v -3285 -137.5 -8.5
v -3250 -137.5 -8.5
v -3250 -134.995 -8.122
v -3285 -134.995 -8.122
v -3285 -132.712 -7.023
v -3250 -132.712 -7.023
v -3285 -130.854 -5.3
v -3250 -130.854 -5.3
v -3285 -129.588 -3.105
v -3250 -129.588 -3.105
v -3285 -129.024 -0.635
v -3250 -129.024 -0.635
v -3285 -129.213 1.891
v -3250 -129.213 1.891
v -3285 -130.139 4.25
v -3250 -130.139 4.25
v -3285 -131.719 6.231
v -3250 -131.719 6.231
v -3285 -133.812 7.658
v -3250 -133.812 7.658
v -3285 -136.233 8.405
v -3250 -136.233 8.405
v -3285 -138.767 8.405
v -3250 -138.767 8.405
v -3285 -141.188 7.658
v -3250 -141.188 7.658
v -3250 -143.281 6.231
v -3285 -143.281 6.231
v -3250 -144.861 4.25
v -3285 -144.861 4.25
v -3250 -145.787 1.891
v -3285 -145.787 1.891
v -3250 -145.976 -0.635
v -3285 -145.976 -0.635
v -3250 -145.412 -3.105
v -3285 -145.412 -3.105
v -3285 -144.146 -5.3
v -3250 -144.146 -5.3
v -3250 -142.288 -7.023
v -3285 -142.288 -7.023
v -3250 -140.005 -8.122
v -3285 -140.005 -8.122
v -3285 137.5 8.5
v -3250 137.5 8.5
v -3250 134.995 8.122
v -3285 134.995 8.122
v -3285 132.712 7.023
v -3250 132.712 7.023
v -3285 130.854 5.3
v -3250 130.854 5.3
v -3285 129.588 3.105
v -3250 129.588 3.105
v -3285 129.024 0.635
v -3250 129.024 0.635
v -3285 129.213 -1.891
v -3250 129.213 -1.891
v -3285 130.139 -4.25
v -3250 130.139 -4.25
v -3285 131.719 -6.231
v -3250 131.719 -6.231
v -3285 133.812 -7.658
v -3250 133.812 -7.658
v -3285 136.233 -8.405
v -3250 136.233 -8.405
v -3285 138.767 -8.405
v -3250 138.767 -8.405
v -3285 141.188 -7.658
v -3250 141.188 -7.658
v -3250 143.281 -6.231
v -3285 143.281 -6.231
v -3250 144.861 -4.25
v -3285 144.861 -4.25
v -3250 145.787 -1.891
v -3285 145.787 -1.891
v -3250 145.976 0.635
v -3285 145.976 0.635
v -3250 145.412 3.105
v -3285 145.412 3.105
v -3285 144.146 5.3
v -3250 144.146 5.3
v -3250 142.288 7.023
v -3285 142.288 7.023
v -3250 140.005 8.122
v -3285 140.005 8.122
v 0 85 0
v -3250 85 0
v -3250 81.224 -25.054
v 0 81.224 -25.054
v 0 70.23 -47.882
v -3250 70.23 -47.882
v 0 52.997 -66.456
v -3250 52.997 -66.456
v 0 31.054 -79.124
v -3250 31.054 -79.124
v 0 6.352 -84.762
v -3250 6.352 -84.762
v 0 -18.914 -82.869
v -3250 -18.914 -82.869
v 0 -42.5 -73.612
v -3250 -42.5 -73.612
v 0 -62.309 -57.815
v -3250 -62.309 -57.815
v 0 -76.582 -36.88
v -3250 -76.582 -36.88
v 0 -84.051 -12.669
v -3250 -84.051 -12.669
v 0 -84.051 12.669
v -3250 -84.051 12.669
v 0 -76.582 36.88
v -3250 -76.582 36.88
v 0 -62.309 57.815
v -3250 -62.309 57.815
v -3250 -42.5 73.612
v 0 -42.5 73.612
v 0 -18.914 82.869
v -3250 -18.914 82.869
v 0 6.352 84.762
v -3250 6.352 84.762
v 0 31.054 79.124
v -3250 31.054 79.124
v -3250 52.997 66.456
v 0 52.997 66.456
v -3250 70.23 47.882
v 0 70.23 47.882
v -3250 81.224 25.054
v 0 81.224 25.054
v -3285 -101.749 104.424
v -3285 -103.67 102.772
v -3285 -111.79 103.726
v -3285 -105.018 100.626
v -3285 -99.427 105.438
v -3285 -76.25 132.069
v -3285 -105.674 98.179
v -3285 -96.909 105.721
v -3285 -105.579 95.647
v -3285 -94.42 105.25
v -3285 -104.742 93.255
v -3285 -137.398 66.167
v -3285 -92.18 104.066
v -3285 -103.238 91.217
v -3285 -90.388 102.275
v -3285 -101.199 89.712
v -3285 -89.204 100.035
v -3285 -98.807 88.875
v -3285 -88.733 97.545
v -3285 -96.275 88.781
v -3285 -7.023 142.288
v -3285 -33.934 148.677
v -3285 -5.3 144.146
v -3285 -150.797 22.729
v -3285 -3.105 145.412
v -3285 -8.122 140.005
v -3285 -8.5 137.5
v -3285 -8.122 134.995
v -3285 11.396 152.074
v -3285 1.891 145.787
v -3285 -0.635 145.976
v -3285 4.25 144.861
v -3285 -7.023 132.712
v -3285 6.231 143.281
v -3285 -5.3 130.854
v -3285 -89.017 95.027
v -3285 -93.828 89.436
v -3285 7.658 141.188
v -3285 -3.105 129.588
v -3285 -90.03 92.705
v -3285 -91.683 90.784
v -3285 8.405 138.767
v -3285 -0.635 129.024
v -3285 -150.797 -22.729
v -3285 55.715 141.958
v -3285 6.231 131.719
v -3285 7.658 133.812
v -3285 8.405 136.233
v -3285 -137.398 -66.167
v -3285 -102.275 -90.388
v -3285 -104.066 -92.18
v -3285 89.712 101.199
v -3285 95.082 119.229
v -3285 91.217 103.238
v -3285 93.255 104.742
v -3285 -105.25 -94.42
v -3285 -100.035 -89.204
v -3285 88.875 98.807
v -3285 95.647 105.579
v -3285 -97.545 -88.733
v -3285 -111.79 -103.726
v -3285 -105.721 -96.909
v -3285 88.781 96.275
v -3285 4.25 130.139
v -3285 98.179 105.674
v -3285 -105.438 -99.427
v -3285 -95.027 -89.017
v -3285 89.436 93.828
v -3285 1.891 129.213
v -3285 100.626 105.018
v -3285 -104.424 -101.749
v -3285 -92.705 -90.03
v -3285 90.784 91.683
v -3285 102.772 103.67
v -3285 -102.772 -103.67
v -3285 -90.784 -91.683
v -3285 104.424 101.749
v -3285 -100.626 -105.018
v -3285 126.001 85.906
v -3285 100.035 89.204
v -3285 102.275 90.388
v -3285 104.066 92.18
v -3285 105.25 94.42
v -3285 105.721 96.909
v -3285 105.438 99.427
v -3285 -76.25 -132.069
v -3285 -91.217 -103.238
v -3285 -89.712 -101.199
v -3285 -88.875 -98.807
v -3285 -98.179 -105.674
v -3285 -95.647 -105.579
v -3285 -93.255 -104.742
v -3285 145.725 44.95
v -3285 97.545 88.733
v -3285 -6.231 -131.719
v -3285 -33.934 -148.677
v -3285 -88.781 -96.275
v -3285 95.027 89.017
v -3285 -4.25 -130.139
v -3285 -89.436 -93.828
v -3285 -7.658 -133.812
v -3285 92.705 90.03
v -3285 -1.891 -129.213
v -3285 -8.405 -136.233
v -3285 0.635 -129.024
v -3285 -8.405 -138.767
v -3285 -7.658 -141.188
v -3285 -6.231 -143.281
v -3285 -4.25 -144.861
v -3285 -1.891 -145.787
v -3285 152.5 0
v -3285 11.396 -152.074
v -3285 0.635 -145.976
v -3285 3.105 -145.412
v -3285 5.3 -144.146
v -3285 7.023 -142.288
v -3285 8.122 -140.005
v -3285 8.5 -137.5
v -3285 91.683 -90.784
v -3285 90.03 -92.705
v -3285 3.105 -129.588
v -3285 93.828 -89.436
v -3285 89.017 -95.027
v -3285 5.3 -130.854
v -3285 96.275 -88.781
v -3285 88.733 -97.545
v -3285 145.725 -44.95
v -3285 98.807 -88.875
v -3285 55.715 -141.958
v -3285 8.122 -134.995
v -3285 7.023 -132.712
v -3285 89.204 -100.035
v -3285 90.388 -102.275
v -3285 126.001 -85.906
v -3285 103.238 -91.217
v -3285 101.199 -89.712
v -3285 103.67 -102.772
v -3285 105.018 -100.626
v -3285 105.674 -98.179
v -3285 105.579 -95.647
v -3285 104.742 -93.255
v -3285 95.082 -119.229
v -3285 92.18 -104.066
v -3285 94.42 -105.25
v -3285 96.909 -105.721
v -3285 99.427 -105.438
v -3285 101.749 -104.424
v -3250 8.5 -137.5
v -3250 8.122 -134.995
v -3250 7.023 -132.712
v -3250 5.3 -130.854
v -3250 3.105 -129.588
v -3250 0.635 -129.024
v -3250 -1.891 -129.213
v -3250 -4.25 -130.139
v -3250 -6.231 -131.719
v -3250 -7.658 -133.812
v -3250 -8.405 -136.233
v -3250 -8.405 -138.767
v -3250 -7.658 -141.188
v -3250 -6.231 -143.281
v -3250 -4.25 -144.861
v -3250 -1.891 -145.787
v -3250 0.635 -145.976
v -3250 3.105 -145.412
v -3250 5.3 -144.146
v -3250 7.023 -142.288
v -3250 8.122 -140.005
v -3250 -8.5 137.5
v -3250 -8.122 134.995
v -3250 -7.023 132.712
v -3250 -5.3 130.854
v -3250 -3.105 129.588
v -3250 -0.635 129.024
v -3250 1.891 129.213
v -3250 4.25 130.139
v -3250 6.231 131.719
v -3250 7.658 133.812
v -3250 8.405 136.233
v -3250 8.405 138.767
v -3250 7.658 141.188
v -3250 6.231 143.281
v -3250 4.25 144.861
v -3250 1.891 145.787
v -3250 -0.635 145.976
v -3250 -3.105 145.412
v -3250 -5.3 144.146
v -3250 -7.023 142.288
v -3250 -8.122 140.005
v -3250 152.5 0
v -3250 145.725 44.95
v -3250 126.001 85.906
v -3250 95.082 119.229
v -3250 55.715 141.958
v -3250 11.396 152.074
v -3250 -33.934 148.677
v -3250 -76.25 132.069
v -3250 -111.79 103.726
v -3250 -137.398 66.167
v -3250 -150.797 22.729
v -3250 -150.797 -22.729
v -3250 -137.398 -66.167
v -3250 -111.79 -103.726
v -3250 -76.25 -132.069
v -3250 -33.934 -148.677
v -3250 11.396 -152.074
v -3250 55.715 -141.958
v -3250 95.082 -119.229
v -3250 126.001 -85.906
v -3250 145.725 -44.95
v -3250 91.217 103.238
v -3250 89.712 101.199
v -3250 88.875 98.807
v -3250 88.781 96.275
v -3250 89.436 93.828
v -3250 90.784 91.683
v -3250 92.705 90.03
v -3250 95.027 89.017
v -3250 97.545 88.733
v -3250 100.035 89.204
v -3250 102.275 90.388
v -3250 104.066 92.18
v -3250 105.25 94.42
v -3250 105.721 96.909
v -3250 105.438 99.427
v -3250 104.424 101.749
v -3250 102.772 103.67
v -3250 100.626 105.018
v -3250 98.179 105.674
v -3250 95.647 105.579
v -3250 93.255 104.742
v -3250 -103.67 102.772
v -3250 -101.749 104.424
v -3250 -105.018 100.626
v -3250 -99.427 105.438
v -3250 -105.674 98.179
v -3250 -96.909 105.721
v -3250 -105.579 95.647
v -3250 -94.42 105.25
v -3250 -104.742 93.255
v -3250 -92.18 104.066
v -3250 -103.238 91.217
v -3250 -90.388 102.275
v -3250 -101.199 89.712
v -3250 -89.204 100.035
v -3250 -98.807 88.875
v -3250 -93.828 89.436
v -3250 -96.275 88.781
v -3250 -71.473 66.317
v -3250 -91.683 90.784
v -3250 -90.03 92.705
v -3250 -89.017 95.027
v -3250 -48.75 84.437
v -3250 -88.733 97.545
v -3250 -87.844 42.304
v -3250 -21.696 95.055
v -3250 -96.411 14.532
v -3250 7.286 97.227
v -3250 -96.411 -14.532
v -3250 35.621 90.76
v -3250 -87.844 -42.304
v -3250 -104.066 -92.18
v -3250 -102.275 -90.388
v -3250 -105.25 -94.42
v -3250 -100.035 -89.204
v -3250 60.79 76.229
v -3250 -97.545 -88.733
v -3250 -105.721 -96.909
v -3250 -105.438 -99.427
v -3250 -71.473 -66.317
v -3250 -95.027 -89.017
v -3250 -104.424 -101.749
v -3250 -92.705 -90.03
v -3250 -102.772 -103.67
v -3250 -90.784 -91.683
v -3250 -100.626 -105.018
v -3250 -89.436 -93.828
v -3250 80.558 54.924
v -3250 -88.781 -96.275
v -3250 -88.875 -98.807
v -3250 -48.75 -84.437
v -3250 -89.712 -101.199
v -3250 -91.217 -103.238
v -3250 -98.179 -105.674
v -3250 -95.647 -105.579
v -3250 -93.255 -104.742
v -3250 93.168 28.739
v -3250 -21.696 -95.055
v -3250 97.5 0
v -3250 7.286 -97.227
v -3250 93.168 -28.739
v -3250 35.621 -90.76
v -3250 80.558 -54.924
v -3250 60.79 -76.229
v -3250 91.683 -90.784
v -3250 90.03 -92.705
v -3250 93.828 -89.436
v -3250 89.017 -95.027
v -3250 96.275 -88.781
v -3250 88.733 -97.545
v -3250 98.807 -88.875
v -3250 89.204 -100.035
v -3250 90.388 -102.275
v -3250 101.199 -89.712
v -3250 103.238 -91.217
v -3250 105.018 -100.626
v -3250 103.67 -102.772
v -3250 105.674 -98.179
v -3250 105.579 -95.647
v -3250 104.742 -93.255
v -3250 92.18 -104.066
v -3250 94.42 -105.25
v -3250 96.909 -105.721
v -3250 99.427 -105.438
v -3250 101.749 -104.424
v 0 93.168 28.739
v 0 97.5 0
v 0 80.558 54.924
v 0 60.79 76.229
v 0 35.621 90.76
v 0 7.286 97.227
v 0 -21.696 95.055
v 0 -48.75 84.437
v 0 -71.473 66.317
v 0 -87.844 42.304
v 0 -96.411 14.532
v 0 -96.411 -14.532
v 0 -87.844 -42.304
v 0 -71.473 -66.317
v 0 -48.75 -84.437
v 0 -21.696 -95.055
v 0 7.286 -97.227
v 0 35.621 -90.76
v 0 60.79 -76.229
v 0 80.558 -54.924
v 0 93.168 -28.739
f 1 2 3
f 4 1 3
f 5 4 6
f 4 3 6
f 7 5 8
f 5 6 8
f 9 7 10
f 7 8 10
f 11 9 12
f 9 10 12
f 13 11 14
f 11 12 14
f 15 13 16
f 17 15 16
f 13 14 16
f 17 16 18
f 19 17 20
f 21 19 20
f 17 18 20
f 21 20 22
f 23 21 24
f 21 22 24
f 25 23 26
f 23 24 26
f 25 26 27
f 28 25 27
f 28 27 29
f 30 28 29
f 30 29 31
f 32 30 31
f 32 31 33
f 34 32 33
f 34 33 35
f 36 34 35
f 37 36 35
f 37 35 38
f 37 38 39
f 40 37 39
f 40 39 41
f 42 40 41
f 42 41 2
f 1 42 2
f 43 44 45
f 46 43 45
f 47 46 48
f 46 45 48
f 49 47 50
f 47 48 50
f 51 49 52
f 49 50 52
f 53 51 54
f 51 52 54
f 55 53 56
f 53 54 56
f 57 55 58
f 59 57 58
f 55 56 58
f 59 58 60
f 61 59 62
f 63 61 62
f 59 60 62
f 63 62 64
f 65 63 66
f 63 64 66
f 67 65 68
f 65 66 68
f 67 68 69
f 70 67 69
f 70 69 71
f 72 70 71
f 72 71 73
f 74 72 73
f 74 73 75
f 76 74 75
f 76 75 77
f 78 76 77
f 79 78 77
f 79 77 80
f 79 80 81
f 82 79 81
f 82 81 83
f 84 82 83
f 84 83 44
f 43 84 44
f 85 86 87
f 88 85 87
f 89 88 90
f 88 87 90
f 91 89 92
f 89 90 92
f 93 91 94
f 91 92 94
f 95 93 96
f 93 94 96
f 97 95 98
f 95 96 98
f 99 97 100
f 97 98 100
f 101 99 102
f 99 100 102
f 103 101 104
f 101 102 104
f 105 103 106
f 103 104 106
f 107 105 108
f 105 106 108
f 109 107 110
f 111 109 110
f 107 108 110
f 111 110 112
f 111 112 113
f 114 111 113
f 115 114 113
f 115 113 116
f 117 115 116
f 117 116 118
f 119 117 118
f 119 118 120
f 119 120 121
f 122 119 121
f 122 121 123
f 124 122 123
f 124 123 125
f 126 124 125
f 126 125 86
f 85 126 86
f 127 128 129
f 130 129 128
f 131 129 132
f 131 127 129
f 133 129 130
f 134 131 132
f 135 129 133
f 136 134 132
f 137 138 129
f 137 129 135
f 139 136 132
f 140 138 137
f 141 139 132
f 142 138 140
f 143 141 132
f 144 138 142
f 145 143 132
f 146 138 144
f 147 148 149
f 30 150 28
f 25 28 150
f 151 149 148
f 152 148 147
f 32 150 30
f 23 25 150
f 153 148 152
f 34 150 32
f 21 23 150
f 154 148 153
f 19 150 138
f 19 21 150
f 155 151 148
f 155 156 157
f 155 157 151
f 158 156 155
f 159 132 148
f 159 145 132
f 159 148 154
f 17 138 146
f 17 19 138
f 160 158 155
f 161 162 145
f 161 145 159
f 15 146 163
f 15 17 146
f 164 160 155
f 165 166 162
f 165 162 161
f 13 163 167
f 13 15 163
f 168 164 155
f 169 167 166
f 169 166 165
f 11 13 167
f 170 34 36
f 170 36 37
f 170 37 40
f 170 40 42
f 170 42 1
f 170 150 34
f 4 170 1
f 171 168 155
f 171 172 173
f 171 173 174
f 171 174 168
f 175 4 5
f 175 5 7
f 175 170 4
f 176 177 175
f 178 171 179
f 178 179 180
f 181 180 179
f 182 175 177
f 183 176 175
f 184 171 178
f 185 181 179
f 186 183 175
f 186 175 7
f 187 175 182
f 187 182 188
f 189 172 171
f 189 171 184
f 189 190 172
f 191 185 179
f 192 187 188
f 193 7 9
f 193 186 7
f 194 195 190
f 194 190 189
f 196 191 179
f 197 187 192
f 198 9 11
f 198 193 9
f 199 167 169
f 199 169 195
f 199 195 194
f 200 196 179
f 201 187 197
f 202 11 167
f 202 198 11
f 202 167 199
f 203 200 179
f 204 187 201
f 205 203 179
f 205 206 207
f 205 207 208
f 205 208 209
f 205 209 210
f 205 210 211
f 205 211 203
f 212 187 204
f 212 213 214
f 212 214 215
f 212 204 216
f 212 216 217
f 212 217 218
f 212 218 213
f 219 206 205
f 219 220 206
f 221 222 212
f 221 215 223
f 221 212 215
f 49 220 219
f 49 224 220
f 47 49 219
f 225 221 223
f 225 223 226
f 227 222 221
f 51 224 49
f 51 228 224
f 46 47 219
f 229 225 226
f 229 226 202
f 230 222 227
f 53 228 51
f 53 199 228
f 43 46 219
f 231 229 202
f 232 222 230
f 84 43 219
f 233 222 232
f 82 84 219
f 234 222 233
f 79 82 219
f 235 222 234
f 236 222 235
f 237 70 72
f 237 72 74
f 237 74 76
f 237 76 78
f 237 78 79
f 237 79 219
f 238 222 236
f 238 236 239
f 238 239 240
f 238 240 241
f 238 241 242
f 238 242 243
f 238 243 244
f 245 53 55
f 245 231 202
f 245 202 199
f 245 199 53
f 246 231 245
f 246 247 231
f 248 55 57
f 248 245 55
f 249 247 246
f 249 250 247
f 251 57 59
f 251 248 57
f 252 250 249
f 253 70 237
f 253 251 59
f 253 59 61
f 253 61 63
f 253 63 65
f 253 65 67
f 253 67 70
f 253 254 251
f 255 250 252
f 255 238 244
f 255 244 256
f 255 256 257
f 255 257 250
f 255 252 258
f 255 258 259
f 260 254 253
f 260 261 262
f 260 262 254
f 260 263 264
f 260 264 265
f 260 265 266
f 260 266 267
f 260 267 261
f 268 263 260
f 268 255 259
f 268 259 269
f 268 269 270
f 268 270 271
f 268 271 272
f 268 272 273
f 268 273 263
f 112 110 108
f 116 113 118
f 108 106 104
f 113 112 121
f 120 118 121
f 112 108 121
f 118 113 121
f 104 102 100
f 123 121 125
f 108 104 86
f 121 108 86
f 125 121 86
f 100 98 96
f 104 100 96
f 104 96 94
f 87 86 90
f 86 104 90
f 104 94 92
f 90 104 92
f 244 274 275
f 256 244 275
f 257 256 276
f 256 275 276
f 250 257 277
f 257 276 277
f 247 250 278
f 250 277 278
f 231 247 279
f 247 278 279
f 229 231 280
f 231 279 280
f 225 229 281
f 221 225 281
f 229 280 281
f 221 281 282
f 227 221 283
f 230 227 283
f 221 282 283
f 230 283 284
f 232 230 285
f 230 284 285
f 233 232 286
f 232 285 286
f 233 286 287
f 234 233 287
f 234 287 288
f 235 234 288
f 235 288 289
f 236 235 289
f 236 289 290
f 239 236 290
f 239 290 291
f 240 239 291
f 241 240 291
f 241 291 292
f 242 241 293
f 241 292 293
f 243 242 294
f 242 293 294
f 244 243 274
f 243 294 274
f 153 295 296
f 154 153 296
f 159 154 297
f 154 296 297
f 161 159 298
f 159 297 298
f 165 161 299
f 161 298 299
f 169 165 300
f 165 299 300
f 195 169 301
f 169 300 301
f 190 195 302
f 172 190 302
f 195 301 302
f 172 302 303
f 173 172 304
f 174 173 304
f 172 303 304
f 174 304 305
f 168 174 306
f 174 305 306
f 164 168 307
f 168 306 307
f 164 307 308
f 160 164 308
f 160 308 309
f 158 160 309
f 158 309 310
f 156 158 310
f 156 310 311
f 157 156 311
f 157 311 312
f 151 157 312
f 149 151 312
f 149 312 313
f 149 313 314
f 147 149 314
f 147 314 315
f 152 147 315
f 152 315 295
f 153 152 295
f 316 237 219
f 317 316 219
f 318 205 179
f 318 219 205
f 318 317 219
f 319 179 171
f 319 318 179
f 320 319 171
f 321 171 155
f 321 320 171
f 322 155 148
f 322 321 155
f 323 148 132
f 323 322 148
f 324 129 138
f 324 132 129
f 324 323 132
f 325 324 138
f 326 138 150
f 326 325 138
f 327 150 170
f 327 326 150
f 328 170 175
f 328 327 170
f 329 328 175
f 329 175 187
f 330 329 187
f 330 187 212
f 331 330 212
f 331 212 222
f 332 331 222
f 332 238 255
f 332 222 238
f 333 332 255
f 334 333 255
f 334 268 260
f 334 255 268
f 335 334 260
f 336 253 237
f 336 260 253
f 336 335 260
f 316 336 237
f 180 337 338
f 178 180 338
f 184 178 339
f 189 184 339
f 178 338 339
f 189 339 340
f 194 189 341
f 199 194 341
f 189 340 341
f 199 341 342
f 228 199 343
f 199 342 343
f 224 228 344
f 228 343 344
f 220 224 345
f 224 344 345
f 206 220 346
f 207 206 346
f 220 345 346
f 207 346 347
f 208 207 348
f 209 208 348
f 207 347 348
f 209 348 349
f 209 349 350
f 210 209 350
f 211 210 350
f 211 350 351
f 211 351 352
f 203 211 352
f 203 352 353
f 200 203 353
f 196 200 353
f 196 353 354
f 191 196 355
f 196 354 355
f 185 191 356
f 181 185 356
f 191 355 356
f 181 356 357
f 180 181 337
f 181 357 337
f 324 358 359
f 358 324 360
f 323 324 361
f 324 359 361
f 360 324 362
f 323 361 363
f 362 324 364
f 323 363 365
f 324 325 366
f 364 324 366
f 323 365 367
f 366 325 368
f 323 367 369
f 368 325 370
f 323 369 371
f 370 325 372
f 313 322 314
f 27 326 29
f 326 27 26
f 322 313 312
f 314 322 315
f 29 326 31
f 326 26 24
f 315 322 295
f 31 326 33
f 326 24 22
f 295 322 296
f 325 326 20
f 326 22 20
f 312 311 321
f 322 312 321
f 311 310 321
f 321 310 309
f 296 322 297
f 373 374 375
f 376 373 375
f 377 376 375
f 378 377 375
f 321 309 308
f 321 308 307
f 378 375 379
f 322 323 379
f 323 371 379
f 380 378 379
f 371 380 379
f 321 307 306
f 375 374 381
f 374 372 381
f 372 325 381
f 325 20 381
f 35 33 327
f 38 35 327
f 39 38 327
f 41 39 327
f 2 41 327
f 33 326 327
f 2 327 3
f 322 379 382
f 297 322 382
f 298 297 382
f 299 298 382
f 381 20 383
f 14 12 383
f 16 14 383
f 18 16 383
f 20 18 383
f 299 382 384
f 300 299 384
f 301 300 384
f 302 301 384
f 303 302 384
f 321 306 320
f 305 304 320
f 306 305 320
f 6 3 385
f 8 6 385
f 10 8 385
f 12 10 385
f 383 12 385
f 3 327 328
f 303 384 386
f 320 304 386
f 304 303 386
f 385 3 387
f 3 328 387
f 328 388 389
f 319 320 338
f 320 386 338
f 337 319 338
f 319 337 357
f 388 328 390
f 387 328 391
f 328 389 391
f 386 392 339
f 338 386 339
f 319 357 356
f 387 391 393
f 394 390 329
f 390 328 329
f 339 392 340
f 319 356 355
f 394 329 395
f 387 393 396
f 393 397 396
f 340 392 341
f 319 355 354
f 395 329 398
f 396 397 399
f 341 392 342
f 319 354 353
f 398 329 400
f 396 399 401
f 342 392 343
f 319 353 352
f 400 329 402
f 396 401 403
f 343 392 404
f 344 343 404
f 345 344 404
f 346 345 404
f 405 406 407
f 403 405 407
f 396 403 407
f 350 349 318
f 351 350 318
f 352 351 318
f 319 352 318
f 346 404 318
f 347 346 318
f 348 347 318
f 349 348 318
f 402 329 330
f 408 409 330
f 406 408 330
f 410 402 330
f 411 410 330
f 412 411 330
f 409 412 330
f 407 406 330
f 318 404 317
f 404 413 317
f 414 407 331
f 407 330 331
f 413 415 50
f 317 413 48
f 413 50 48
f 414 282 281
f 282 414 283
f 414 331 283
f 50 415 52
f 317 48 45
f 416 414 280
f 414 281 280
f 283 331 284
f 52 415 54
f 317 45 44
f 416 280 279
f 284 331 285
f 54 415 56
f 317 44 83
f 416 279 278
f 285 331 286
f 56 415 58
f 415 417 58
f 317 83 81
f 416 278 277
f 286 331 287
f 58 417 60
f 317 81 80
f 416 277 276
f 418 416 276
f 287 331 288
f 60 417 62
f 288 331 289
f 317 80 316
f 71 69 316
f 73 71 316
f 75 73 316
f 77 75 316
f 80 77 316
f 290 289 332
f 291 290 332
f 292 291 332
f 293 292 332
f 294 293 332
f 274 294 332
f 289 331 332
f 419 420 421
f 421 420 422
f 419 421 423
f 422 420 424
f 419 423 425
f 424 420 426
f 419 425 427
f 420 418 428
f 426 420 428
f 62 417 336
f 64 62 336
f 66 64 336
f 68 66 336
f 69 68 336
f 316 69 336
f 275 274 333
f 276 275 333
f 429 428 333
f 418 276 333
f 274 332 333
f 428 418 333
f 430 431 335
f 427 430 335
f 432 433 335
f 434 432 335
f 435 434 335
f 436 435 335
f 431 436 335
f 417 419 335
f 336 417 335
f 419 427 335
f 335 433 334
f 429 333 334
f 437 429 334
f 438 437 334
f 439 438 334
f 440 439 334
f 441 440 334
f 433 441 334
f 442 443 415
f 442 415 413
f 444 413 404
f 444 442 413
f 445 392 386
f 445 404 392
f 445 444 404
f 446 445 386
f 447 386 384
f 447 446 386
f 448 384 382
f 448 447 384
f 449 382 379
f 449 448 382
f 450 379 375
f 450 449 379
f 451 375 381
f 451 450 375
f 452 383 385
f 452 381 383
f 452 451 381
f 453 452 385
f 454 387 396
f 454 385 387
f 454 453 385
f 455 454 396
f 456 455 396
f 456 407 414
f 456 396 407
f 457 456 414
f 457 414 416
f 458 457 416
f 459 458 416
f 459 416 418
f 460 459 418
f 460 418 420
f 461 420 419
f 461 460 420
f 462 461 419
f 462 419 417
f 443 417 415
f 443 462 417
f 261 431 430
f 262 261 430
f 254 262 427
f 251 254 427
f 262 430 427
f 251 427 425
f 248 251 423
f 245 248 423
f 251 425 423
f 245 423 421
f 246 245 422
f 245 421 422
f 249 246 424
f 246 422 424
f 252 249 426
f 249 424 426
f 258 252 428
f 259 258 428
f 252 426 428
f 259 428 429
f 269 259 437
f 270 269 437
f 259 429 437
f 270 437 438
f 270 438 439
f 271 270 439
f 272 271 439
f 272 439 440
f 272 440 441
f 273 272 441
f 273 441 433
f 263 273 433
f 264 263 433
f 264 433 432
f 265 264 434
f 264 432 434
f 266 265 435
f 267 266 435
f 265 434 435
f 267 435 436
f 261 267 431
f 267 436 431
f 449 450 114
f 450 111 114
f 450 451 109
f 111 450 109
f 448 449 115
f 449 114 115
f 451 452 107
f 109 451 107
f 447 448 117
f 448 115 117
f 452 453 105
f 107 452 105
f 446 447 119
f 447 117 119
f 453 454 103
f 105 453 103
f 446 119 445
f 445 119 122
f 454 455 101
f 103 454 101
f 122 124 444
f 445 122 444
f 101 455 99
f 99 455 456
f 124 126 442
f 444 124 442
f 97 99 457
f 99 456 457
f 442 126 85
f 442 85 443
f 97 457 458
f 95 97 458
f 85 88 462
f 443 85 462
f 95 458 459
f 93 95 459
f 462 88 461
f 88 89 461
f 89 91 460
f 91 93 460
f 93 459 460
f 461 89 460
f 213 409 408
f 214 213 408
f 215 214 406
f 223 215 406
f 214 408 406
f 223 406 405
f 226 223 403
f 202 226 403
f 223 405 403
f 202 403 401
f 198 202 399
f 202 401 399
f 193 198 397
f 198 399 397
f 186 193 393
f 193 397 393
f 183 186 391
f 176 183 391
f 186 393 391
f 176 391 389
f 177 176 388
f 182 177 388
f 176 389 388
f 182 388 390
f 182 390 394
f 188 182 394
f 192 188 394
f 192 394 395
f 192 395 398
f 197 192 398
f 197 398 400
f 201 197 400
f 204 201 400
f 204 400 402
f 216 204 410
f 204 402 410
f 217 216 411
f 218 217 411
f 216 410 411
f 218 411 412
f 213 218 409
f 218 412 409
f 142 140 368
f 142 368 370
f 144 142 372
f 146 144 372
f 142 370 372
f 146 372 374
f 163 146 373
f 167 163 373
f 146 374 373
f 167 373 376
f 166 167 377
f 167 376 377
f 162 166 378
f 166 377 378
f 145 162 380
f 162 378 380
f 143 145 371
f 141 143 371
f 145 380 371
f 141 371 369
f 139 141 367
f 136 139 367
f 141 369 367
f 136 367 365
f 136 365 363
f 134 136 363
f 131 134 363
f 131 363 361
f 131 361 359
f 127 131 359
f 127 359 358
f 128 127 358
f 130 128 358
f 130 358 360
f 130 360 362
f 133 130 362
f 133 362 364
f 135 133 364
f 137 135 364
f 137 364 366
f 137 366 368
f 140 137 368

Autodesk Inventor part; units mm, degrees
ref_plane "YZ Plane" through (0, 0, 0) normal (1, 0, 0) x (0, 1, 0)
ref_plane "XZ Plane" through (0, 0, 0) normal (0, 1, 0) x (-1, 0, 0)
ref_plane "XY Plane" through (0, 0, 0) normal (0, 0, 1) x (1, 0, 0)
sketch "Эскиз1" plane through (0, 0, 0) normal (0, 0, 1) x (1, 0, 0)
  line L0 (0, 0) -> (-3428.5795, 0)
  line L1 (-3285, 0) -> (-3285, 152.5)
  line L2 (-3285, 152.5) -> (-3250, 152.5)
  line L3 (-3250, 152.5) -> (-3250, 97.5)
  line L4 (-3250, 97.5) -> (0, 97.5)
  line L5 (0, 97.5) -> (0, 0)
  line L6 (0, 85) -> (-3250, 85)
  line L7 (-3250, 85) -> (-3250, 0)
  dimension "d0" = 3285
  dimension "d1" = 305
  dimension "d2" = 35
  dimension "d3" = 170
  dimension "d4" = 195
revolve "Вращение1" add sketch "Эскиз1" angle 360 about axis through (0, 0, 0) along (-1, 0, 0) contours L0 L1 L2 L3 L4 L5 L6 L7
sketch "Эскиз2" plane through (-3285, 0, 0) normal (-1, 0, 0) x (0, 0, 1)
  circle A0 centre (0, 0) radius 137.5 construction
  point P0 (0, 137.5)
  dimension "d6" = 275
hole "Отверстие1" at (-3285, 137.5, 0) direction (1, 0, 0) diameter 17 end through all
pattern_circular "Круговой массив1" count 8 over 360 about axis through (-3267.5, 0, 0) along (1, 0, 0) of "Отверстие1"
properties part number "Lift.02.00.00.01" material "Сталь нержавеющая, 440C"
